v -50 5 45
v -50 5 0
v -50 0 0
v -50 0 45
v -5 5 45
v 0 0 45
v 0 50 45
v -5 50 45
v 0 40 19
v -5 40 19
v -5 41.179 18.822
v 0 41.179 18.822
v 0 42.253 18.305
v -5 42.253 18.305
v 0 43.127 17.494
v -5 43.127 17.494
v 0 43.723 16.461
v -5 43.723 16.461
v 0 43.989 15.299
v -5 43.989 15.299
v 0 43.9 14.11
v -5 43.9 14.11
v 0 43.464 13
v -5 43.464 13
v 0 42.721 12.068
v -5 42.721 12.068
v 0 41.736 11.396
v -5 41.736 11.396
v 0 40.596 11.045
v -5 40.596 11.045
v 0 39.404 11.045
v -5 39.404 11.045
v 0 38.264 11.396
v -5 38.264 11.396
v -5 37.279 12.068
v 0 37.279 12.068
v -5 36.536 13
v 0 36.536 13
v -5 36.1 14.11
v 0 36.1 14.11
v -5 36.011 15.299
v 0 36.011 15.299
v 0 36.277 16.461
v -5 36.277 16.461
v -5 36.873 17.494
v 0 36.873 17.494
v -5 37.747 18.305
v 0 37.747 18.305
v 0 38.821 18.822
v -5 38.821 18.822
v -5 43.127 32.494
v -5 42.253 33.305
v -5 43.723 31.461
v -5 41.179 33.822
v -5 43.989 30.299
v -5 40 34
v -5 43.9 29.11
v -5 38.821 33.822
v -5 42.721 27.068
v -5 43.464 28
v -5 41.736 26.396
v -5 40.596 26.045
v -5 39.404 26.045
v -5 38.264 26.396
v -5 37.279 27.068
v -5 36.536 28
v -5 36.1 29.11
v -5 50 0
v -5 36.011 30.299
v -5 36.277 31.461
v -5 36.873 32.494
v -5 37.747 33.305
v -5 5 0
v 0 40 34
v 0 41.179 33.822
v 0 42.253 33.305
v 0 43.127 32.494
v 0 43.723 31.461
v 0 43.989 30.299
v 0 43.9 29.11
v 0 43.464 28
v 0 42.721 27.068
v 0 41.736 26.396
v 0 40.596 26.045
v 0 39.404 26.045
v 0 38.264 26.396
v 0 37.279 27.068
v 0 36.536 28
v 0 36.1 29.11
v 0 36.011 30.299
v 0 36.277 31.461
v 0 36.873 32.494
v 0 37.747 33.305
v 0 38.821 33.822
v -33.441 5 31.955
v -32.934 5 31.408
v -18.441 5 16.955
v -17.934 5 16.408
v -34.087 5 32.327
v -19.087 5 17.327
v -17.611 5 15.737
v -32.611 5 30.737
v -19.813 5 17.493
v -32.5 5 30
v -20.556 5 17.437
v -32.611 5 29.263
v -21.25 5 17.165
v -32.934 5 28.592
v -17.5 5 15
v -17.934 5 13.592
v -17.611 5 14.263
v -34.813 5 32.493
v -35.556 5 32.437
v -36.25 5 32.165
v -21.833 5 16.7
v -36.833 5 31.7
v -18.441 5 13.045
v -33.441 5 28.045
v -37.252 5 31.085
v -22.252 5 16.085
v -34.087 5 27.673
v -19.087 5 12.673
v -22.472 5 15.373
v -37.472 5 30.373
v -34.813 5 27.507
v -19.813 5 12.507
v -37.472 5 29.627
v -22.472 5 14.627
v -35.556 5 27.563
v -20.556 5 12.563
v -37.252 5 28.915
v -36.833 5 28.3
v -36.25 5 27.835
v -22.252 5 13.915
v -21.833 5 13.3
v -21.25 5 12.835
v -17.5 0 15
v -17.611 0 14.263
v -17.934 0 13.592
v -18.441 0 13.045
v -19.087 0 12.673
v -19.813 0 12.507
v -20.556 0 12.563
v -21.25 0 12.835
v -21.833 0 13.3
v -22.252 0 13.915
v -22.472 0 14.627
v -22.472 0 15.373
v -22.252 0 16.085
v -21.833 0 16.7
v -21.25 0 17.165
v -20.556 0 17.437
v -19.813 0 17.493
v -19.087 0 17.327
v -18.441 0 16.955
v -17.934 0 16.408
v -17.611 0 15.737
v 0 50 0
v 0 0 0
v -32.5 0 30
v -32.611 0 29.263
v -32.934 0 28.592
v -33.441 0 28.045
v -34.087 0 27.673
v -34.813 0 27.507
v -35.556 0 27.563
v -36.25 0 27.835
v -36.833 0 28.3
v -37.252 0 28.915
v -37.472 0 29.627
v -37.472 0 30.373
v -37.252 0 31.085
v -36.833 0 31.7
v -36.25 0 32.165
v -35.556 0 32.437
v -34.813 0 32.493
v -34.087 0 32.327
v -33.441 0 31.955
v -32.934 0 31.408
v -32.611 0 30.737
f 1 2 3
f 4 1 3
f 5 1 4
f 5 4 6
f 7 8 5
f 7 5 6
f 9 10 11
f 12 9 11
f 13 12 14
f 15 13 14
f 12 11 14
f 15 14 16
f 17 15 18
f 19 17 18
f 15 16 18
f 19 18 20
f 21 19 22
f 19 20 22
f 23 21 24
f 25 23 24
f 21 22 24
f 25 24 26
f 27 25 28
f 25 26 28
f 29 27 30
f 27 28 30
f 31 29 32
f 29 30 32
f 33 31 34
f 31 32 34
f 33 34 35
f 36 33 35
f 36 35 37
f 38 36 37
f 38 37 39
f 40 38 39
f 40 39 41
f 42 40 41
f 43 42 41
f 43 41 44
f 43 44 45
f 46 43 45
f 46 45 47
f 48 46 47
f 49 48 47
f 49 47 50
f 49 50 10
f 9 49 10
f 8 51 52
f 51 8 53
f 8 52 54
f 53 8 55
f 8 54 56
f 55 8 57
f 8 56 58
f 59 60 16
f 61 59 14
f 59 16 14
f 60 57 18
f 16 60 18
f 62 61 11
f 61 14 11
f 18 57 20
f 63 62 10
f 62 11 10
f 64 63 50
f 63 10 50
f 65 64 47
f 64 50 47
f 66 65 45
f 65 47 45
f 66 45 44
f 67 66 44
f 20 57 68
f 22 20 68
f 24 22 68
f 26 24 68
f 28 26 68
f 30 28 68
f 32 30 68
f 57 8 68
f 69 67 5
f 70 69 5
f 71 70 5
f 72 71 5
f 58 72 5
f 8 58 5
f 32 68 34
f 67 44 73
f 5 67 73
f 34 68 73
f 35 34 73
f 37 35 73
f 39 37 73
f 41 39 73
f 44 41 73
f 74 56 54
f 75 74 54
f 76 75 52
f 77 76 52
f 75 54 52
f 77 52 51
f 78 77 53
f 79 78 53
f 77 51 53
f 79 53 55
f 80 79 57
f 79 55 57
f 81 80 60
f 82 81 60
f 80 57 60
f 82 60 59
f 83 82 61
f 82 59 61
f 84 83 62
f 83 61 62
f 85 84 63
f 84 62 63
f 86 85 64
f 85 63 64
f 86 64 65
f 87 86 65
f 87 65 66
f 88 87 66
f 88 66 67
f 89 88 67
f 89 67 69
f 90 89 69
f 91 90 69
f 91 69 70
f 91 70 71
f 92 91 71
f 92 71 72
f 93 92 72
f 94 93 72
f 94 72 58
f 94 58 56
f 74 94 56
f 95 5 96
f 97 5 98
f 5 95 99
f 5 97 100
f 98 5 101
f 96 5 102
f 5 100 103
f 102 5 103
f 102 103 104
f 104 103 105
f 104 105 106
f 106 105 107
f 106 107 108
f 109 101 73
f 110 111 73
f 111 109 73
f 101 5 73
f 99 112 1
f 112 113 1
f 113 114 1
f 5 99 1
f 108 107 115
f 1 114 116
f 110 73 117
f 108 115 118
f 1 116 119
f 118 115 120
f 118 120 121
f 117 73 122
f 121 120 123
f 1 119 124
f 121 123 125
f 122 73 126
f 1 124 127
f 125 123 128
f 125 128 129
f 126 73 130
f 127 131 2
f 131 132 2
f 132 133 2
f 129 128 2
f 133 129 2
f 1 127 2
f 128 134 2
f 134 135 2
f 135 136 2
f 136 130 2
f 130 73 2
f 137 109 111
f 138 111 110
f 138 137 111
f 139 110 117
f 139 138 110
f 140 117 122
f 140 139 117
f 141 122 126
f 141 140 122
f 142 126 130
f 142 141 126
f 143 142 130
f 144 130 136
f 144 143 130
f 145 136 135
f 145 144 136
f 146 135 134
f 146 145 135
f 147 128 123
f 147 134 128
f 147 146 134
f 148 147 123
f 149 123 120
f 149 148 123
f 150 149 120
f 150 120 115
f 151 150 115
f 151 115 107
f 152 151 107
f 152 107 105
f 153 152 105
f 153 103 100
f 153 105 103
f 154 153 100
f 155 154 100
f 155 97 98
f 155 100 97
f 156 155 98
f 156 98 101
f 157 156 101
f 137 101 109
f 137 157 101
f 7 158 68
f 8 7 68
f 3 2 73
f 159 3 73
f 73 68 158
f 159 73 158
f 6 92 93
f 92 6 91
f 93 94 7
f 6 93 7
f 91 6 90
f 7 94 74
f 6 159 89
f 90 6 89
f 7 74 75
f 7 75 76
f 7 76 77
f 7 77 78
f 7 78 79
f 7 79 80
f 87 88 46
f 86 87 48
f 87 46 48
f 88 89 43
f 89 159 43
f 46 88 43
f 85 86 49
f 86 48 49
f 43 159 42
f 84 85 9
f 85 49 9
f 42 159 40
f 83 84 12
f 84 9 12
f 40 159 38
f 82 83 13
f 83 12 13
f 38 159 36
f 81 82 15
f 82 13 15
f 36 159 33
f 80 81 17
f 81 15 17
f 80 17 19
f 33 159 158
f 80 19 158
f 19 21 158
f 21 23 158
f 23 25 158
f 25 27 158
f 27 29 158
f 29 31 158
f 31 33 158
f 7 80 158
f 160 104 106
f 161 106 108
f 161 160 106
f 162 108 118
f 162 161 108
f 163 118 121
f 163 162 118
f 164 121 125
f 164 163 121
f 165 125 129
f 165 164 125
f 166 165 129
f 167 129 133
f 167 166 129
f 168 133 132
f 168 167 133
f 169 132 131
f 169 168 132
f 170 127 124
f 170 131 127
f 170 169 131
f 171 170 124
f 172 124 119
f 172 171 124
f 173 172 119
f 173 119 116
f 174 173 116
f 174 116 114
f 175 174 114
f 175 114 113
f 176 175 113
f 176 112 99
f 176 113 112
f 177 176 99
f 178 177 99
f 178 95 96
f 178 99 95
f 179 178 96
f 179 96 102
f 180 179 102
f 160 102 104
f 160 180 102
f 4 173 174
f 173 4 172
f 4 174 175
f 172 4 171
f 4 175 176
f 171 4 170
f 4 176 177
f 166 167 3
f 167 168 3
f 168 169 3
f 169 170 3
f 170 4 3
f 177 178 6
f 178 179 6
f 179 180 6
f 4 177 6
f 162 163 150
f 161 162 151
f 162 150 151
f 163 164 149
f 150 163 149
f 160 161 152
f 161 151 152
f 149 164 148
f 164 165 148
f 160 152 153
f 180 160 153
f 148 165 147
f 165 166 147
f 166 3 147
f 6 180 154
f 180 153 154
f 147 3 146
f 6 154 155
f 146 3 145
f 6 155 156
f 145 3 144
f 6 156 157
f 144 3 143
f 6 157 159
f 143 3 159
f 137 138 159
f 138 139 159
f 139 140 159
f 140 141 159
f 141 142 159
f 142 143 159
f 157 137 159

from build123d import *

# Parameters (mm, degrees)
BOSS_EXTRUDE1_DEPTH = 45
SKETCH2_R           = 4
CUT_EXTRUDE1_DEPTH  = 81.932070281
SKETCH3_R           = 2.5
CUT_EXTRUDE3_DEPTH  = 84.815273071


with BuildPart() as part:
    # Sketch1 → Boss-Extrude1 (new body)
    with BuildSketch(Plane.XY):
        Polygon((0, 0), (0, 50), (-5, 50), (-5, 5), (-50, 5), (-50, 0), align=None)
    extrude(amount=BOSS_EXTRUDE1_DEPTH)

    # Sketch2 → Cut-Extrude1 (cut, through all)
    with BuildSketch(Plane.ZY.offset(5)):
        with Locations((15, 40)):
            Circle(SKETCH2_R)
        with Locations((30, 40)):
            Circle(SKETCH2_R)
    extrude(amount=-CUT_EXTRUDE1_DEPTH, mode=Mode.SUBTRACT)

    # Sketch3 → Cut-Extrude3 (cut, through all)
    with BuildSketch(Plane(origin=(0, 0, 0), x_dir=(1, 0, 0), z_dir=(0, 1, 0))):
        with Locations((-35, -30)):
            Circle(SKETCH3_R)
        with Locations((-20, -15)):
            Circle(SKETCH3_R)
    extrude(amount=CUT_EXTRUDE3_DEPTH, mode=Mode.SUBTRACT)


solid = part.part
